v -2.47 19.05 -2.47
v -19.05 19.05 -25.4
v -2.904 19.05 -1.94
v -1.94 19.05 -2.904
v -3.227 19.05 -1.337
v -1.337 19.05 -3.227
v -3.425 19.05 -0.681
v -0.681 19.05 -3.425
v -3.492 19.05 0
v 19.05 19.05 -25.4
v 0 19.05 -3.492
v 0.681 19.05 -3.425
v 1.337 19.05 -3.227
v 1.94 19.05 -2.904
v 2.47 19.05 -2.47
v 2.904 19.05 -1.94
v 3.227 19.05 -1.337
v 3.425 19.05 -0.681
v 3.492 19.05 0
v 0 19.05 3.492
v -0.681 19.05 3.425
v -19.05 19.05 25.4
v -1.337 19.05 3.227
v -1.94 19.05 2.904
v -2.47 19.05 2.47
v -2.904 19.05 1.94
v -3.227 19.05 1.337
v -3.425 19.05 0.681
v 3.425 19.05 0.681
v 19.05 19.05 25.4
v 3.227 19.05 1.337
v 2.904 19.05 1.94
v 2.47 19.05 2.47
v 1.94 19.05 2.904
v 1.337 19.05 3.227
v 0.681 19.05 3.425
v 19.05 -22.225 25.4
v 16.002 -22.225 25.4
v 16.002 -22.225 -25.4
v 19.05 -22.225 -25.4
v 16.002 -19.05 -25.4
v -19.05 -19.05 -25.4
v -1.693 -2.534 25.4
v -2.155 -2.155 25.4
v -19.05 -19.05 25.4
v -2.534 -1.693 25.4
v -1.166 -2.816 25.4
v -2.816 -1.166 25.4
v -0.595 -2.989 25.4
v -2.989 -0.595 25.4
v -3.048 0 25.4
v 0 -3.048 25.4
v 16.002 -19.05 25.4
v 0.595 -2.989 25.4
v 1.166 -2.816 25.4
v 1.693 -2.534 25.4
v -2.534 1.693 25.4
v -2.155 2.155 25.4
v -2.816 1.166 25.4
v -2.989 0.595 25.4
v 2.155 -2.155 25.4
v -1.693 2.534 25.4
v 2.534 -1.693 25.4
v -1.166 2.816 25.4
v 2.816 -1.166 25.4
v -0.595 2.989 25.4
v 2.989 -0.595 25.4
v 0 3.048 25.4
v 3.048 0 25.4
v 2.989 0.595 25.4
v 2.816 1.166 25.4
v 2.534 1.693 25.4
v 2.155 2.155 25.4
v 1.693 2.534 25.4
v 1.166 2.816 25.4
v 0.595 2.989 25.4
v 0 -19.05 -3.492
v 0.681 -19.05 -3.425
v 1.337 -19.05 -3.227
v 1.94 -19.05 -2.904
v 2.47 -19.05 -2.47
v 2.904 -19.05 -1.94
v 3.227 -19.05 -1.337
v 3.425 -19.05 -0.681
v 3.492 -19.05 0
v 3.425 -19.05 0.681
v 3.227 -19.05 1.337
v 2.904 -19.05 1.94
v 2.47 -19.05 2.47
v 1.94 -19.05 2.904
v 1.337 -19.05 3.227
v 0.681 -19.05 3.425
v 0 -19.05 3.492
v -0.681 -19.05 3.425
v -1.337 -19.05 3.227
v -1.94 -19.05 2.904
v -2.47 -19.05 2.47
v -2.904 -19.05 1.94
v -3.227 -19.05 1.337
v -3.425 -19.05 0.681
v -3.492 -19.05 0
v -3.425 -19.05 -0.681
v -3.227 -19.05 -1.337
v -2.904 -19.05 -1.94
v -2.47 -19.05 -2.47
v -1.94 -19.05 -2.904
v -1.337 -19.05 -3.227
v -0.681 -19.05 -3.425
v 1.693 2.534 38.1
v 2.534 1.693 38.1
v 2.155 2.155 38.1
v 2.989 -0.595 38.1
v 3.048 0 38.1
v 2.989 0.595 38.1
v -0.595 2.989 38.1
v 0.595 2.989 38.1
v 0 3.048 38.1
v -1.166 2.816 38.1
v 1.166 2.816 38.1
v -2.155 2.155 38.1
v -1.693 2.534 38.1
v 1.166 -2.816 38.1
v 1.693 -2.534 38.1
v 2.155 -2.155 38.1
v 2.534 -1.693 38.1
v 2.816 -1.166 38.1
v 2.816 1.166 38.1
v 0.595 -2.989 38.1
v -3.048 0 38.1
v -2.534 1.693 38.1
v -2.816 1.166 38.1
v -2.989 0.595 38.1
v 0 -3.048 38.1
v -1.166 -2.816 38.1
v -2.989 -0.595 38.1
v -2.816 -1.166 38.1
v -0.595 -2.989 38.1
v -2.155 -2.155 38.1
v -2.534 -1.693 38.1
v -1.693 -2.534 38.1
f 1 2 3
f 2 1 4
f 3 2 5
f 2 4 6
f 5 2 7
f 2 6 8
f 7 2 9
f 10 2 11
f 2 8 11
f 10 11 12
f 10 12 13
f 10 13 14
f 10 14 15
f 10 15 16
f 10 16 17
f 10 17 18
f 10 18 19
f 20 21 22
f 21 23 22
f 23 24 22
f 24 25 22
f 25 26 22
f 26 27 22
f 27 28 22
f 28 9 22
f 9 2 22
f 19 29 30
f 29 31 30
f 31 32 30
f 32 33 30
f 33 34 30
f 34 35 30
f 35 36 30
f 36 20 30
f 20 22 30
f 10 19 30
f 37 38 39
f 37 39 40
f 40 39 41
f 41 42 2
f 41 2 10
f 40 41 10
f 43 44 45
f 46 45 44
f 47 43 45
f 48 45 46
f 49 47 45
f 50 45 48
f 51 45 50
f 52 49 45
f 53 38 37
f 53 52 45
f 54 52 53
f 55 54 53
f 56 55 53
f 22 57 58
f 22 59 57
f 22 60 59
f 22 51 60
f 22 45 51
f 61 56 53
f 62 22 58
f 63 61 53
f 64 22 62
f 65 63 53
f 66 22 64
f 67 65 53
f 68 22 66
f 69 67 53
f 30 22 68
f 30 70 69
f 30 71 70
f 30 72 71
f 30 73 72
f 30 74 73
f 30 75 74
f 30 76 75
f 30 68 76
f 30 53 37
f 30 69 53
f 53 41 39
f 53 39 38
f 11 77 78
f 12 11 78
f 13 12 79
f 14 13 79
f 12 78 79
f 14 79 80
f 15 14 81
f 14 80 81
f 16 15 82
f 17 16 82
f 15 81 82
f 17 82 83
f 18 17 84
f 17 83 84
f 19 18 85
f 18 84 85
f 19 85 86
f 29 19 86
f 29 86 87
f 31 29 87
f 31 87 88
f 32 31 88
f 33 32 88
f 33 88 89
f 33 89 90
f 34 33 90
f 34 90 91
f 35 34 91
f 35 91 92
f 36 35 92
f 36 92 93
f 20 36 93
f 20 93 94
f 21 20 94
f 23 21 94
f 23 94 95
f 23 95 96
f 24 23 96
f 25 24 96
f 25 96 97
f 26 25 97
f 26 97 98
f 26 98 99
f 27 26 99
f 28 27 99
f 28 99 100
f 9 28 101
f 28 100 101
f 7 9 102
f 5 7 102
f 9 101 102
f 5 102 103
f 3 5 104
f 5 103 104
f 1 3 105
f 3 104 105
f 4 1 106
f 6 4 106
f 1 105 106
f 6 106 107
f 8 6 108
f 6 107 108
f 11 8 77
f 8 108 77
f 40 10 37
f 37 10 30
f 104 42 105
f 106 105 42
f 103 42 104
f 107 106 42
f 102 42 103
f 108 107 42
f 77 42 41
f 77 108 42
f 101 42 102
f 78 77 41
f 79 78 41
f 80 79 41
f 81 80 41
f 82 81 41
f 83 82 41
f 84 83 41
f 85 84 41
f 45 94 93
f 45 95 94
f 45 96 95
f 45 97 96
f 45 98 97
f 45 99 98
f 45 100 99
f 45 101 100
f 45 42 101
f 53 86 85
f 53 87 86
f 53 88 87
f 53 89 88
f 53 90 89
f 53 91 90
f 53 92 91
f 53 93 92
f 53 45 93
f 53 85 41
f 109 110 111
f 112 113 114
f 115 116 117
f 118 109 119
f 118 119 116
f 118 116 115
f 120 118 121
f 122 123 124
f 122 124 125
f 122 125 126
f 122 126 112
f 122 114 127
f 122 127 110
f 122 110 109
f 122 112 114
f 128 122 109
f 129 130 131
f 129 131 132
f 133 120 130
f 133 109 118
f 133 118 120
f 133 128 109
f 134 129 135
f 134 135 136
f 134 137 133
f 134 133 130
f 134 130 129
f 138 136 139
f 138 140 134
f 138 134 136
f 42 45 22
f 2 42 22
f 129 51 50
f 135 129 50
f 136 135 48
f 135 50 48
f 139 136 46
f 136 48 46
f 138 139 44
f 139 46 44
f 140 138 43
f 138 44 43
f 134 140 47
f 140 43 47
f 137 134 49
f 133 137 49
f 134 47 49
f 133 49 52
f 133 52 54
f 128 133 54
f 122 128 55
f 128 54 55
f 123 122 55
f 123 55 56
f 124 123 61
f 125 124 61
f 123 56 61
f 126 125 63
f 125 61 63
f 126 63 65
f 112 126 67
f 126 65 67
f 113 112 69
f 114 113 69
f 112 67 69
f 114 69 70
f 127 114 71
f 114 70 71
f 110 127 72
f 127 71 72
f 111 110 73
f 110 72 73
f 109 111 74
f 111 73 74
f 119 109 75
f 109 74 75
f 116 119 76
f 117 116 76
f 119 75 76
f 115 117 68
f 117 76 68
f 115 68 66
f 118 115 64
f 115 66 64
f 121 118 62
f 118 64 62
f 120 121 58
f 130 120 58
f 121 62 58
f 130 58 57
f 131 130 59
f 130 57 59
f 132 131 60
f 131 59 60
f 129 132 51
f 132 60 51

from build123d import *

# Parameters (mm, degrees)
SKETCH1_W           = 38.1
SKETCH1_H           = 38.1
BOSS_EXTRUDE1_DEPTH = 25.4
SKETCH2_R           = 3.048
BOSS_EXTRUDE2_DEPTH = 12.7
SKETCH3_W           = 3.048
SKETCH3_H           = 50.8
BOSS_EXTRUDE3_DEPTH = 3.175
SKETCH4_R           = 3.4925
CUT_EXTRUDE1_DEPTH  = 58.15


with BuildPart() as part:
    # Sketch1 → Boss-Extrude1 (new, symmetric)
    with BuildSketch(Plane.XY):
        Rectangle(SKETCH1_W, SKETCH1_H)
    extrude(amount=BOSS_EXTRUDE1_DEPTH, both=True)

    # Sketch2 → Boss-Extrude2 (add)
    with BuildSketch(Plane.XY.offset(25.4)):
        with Locations(Location((0, 0, 0), (0, 0, 180))):
            Circle(SKETCH2_R)
    extrude(amount=BOSS_EXTRUDE2_DEPTH)

    # Sketch3 → Boss-Extrude3 (add)
    with BuildSketch(Plane.XZ.offset(19.05)):
        with Locations((17.526, 0)):
            Rectangle(SKETCH3_W, SKETCH3_H)
    extrude(amount=BOSS_EXTRUDE3_DEPTH)

    # Sketch4 → Cut-Extrude1 (cut, through all)
    with BuildSketch(Plane.XZ.offset(19.05)):
        with Locations(Location((0, 0, 0), (0, 0, 270))):
            Circle(SKETCH4_R)
    extrude(amount=-CUT_EXTRUDE1_DEPTH, mode=Mode.SUBTRACT)


solid = part.part
